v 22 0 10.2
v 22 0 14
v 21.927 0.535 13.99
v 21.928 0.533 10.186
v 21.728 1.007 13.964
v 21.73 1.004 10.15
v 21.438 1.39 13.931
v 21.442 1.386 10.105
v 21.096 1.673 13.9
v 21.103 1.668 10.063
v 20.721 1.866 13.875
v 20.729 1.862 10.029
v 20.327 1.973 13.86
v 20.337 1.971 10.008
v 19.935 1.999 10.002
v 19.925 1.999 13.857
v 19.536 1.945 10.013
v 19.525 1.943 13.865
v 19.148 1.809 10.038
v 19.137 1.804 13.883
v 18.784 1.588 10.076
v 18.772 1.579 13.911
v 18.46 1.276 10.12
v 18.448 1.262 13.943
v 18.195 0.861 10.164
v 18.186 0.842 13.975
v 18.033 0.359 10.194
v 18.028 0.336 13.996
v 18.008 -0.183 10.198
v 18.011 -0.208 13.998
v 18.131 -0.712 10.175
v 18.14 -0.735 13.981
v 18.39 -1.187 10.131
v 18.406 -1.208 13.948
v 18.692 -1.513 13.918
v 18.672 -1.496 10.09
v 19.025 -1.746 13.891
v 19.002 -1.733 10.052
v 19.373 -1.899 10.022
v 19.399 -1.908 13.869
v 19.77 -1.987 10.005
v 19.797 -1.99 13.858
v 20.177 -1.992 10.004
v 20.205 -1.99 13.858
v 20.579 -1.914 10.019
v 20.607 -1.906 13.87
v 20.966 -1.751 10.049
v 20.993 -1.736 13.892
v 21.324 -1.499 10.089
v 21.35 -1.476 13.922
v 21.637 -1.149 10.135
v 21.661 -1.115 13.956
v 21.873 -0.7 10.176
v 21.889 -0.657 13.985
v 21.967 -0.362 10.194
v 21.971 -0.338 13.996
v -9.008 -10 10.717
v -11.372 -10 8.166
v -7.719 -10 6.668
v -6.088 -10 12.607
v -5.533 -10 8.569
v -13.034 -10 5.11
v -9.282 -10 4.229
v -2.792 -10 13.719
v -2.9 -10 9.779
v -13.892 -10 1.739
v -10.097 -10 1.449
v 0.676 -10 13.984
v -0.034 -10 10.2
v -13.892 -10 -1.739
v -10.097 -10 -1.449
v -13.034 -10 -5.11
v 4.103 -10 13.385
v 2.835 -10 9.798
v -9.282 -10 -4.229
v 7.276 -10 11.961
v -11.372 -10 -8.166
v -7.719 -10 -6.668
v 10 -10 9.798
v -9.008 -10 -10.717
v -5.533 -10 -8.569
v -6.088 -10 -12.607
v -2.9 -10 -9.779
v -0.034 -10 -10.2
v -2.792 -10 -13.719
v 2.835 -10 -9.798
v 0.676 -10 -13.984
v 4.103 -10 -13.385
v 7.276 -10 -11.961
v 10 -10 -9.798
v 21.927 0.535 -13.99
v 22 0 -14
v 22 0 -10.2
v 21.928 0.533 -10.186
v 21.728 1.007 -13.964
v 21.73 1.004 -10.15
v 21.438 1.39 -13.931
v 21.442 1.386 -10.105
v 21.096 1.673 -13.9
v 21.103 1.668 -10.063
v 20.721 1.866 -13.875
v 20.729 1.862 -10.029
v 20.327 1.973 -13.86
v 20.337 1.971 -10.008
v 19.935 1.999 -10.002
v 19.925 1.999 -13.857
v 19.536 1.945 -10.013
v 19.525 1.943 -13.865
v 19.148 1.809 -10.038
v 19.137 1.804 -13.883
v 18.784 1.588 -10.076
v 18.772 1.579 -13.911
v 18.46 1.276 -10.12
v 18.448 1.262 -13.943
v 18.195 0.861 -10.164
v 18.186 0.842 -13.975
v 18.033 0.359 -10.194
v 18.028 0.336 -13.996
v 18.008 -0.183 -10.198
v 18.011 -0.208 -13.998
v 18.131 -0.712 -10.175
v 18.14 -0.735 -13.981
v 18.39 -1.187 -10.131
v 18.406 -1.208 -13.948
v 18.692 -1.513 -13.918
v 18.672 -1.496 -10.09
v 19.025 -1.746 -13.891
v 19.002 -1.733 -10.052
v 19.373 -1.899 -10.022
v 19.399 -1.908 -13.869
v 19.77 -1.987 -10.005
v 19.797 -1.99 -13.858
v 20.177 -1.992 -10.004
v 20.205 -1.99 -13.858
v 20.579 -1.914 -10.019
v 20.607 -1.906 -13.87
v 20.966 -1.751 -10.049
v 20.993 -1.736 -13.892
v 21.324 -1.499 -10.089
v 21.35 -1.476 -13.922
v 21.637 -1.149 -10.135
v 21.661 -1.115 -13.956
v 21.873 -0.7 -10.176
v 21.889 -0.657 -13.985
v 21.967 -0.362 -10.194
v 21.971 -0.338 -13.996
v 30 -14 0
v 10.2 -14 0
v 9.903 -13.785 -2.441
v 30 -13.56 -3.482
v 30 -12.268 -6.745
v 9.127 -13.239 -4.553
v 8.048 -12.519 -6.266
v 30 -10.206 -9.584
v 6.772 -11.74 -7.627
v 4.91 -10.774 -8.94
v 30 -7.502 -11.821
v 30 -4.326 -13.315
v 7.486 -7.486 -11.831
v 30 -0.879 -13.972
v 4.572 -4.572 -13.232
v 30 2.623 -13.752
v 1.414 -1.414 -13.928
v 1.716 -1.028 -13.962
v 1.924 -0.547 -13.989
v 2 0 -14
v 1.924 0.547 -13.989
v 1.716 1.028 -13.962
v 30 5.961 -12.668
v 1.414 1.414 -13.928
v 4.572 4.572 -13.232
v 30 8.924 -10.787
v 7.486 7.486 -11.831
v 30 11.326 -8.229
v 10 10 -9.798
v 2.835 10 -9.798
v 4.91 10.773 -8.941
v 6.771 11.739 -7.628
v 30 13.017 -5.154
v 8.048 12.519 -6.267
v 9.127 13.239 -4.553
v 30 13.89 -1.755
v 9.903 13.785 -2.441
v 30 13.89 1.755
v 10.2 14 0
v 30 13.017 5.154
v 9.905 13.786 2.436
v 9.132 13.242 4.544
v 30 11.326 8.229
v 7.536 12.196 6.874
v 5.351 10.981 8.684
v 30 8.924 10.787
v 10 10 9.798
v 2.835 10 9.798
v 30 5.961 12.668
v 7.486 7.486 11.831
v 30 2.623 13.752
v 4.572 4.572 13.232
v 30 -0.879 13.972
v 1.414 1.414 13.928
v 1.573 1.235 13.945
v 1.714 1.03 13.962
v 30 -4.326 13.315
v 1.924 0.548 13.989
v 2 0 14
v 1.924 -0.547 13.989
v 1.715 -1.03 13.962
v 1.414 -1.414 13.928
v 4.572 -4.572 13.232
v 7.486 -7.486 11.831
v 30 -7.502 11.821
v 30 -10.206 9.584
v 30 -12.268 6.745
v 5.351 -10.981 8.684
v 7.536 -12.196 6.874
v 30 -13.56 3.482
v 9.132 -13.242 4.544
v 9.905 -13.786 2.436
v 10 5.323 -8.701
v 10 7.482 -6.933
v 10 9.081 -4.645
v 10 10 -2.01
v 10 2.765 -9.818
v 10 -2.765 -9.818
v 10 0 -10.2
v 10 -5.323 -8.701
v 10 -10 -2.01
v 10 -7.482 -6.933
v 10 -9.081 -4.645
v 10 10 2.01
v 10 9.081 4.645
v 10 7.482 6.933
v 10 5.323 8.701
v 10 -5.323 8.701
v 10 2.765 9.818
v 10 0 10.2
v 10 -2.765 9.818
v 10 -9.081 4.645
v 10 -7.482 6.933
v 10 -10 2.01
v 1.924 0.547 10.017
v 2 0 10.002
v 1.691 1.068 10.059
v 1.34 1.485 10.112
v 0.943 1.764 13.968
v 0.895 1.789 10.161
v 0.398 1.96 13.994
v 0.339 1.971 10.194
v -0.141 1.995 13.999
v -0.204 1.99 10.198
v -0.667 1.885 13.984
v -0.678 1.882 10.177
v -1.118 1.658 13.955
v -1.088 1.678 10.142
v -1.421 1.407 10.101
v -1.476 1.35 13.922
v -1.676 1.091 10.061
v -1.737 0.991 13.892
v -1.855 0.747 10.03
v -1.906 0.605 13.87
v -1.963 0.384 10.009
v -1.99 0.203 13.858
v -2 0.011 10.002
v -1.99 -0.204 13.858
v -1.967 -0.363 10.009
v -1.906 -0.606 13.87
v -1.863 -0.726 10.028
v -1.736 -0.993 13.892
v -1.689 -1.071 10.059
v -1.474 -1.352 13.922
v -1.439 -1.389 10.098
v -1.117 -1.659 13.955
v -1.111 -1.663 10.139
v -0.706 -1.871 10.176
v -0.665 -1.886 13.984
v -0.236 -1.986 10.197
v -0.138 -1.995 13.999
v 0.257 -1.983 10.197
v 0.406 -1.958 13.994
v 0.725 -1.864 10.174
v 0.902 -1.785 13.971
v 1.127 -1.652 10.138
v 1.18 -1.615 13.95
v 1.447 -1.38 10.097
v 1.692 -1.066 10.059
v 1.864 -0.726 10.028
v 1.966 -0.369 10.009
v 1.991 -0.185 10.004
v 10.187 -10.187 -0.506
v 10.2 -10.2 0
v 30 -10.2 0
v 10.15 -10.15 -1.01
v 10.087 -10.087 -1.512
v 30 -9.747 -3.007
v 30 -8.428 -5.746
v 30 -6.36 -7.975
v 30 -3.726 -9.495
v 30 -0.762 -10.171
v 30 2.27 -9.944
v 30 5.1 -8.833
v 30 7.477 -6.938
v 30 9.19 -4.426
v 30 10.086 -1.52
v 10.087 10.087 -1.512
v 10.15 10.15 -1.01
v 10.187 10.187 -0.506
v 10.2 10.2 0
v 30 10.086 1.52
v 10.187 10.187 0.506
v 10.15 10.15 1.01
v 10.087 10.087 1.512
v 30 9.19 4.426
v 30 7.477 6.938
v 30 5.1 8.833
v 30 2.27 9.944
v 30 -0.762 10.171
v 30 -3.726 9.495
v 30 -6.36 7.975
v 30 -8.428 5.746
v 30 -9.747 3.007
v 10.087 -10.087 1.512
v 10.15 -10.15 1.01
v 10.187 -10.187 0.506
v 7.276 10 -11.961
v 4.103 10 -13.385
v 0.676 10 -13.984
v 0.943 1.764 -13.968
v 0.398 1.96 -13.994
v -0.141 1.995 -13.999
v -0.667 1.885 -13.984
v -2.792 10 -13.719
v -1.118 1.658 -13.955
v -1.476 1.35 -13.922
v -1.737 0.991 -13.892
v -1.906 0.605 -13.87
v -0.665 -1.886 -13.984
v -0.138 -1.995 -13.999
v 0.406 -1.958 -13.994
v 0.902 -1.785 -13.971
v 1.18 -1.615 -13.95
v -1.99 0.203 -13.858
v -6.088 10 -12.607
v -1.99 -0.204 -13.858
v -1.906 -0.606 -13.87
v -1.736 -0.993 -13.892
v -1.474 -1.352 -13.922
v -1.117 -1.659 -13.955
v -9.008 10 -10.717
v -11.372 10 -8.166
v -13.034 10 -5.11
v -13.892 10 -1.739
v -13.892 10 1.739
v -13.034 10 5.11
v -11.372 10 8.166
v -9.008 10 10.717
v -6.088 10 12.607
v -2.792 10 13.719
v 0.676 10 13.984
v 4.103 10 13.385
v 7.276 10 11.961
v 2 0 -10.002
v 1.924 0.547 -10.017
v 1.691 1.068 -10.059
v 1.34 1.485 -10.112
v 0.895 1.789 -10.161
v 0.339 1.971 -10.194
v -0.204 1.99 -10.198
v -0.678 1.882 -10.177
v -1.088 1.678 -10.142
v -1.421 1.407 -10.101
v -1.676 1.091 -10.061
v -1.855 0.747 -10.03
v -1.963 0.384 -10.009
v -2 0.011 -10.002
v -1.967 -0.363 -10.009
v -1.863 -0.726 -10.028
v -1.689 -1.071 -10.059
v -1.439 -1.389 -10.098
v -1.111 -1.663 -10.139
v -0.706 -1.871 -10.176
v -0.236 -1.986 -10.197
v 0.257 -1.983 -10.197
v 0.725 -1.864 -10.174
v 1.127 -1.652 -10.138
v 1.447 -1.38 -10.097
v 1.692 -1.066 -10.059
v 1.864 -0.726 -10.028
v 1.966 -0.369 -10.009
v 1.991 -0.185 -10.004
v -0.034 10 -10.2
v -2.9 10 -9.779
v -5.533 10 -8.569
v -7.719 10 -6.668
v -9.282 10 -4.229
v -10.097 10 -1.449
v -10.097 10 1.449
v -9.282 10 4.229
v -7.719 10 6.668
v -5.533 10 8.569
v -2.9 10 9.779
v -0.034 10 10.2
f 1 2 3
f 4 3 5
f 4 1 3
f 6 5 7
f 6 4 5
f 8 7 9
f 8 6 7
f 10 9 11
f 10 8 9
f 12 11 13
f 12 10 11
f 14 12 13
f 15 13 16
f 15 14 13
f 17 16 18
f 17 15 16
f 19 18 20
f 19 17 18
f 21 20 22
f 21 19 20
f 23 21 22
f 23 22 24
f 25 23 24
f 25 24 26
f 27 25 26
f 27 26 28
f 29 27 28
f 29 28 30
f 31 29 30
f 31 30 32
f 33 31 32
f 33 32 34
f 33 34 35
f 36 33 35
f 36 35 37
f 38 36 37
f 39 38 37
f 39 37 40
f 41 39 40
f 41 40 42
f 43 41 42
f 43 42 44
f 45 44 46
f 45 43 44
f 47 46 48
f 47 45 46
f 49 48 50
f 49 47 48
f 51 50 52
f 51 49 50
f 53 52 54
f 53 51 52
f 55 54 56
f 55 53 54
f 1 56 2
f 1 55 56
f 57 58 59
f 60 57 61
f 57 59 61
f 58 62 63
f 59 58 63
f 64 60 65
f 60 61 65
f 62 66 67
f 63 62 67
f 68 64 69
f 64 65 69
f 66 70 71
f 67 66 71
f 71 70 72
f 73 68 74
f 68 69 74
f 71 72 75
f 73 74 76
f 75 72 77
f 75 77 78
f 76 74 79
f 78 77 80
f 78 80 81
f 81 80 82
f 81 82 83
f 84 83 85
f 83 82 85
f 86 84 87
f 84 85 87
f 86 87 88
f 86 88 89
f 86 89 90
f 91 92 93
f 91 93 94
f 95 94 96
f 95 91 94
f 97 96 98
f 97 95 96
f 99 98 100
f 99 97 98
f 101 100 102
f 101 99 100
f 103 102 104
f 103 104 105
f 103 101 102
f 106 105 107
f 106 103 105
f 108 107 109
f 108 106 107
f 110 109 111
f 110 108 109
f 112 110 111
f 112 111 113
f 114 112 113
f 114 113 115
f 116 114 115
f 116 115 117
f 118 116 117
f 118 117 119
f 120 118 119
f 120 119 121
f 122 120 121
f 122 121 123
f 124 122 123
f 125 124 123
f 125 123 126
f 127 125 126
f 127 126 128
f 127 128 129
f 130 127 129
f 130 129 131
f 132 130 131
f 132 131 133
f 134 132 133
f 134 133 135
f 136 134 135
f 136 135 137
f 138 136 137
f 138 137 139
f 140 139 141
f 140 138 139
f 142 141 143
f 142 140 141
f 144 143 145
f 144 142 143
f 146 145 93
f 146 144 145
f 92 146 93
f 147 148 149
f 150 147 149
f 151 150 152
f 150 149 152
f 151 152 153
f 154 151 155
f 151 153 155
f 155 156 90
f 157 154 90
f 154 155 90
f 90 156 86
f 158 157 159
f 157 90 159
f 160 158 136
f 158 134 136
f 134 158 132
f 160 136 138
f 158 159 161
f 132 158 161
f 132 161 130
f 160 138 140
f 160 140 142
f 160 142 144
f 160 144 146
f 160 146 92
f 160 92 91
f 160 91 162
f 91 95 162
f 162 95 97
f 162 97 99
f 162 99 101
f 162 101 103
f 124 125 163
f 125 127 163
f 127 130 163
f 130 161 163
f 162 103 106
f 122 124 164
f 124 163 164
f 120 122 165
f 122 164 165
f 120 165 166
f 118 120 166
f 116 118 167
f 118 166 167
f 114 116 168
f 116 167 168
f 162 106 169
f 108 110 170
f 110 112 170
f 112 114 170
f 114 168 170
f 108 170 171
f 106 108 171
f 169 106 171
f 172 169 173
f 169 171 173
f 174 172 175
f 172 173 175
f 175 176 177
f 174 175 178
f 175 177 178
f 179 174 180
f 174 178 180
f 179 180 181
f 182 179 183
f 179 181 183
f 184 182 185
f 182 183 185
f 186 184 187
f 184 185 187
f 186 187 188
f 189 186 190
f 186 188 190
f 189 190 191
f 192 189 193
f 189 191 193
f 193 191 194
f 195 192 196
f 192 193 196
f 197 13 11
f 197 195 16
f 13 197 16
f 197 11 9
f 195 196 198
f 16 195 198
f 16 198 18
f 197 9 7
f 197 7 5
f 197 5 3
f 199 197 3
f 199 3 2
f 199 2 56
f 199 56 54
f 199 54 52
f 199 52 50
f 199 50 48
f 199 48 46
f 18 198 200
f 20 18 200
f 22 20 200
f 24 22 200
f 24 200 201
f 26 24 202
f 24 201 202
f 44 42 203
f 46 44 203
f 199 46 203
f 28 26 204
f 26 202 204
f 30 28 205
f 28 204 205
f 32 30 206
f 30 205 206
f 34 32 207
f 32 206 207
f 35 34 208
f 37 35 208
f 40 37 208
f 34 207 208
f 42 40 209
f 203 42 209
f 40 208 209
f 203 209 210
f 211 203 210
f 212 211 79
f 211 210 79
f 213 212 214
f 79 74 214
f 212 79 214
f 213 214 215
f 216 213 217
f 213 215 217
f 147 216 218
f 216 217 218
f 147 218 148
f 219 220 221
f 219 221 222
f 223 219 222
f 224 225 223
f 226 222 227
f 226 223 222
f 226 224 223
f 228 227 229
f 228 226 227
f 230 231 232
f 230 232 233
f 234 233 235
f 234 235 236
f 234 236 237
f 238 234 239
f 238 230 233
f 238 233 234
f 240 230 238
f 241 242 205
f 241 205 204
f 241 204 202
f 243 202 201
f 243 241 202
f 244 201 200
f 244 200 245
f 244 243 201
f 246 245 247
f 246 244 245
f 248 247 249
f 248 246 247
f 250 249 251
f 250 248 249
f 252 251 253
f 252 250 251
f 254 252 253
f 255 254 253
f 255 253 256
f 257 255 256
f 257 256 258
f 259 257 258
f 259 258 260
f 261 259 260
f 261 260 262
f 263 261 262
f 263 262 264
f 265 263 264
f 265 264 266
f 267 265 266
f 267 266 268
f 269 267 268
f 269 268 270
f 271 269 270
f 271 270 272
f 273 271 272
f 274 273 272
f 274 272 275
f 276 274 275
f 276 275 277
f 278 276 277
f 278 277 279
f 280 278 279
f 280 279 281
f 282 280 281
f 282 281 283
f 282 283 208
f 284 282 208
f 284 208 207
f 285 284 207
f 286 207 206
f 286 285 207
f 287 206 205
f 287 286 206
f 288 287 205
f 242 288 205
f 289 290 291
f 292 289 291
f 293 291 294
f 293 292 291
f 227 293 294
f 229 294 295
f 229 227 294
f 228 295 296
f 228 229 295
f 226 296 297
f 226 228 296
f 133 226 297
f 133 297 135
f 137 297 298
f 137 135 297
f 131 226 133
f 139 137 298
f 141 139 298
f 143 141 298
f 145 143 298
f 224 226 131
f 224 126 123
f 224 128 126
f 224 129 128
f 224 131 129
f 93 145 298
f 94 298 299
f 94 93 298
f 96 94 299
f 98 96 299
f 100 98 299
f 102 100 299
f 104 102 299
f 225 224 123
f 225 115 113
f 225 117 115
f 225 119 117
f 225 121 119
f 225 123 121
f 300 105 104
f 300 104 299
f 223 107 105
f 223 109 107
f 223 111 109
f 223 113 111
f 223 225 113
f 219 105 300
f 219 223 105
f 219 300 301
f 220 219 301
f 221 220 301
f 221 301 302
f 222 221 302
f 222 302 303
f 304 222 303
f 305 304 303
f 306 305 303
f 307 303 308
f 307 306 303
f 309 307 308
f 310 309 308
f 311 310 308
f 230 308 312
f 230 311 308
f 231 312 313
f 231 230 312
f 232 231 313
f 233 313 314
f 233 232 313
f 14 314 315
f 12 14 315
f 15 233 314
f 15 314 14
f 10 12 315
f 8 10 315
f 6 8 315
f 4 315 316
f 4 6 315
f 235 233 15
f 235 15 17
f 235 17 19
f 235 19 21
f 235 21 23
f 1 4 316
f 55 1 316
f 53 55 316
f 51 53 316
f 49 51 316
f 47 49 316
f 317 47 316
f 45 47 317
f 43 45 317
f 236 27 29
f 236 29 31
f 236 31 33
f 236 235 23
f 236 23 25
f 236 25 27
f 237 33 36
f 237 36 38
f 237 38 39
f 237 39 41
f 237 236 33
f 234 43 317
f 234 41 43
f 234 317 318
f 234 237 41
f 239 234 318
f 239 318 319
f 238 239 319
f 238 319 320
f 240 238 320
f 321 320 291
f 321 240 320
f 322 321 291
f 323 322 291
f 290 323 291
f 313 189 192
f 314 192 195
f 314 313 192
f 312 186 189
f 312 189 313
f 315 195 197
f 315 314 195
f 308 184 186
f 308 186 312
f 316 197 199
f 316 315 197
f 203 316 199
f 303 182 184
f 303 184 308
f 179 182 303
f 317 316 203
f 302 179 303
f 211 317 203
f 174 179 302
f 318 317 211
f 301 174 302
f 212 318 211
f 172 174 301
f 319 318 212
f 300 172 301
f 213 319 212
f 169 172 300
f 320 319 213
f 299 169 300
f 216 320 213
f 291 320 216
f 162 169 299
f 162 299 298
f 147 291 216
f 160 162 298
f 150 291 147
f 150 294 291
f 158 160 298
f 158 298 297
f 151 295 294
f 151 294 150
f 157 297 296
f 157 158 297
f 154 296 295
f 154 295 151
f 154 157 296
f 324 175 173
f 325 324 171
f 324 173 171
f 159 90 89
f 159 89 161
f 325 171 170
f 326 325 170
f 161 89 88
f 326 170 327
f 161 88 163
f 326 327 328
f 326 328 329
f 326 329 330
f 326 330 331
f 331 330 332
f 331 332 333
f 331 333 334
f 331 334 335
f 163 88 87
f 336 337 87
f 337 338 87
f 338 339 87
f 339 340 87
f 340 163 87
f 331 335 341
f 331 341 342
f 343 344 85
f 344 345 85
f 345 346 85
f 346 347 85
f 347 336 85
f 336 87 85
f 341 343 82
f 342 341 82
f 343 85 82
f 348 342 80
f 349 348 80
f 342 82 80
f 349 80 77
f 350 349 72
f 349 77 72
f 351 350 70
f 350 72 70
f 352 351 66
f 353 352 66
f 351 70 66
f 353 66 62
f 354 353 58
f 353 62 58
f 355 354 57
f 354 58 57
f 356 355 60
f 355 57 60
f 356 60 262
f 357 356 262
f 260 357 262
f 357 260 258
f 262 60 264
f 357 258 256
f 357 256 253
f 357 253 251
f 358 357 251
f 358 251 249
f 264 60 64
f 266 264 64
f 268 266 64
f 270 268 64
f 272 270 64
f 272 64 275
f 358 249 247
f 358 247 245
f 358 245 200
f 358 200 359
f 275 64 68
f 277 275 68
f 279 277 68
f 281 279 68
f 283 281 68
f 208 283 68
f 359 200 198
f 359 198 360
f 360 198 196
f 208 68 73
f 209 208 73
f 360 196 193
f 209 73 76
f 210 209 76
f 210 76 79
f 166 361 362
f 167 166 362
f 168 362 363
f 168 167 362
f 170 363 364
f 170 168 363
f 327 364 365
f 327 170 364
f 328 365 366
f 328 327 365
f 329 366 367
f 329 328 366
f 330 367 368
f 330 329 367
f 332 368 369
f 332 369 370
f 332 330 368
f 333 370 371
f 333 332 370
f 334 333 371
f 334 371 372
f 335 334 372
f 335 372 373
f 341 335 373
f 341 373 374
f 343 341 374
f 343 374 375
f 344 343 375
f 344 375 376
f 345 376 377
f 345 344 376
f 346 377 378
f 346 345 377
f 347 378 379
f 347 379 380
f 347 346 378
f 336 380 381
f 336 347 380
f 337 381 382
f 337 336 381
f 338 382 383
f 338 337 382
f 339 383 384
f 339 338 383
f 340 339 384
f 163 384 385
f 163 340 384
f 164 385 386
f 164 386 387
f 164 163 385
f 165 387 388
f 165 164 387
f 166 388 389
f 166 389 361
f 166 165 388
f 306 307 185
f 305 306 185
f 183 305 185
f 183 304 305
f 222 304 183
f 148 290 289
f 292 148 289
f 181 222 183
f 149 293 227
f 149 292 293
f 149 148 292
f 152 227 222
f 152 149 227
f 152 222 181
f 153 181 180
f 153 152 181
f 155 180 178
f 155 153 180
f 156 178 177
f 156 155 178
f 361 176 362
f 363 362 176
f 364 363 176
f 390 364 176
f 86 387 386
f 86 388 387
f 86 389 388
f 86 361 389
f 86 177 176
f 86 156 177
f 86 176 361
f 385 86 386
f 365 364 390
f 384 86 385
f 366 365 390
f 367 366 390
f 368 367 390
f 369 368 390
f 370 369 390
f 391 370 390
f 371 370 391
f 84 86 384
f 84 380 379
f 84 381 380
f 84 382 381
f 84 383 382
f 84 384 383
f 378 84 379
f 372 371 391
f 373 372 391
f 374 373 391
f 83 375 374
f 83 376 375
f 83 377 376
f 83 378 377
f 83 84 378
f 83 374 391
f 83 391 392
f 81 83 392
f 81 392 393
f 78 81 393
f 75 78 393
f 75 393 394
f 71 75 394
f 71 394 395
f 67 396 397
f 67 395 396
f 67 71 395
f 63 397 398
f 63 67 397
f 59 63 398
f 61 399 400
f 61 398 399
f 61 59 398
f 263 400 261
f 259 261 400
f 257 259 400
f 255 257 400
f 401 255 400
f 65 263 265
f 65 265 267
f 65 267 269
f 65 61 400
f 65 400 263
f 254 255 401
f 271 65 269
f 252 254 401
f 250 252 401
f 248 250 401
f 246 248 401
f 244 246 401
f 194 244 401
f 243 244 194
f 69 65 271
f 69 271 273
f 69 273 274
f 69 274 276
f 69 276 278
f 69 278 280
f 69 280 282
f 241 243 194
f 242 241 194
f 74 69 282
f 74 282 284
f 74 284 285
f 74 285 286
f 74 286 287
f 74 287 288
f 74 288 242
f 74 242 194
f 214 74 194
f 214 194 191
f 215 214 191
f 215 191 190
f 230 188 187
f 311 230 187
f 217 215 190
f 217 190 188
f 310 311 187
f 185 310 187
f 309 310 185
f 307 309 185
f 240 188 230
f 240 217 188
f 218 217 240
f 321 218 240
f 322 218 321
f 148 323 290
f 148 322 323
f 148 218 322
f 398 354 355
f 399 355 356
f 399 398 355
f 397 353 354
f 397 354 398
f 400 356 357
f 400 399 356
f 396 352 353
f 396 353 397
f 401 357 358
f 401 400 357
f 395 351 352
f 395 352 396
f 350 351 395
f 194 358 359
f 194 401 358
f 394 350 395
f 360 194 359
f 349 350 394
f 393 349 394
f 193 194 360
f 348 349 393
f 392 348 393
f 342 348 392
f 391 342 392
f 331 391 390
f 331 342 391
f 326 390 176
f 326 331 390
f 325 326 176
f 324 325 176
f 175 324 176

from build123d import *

# Parameters (mm, degrees)
CYLINDER001_R          = 10.2
CYLINDER001_DEPTH      = 20
CYLINDER002_R          = 2
CYLINDER002_DEPTH      = 30
CYLINDER003_R          = 2
CYLINDER003_DEPTH      = 30
CYLINDER_R             = 10.2
CYLINDER_DEPTH         = 30
CYLINDER_ROLL_ANGLE    = -90
CYLINDER004_R          = 14
CYLINDER004_DEPTH      = 30
CYLINDER005_R          = 14
CYLINDER005_DEPTH      = 20
CYLINDER005_ROLL_ANGLE = -90


with BuildPart() as cylinder001:
    # Cylinder001 → Cylinder001 (new body)
    with BuildSketch(Plane(origin=(10, 0, 0), x_dir=(0, -1, 0), z_dir=(1, 0, 0))):
        Circle(CYLINDER001_R)
    extrude(amount=CYLINDER001_DEPTH)


with BuildPart() as cylinder002:
    # Cylinder002 → Cylinder002 (new body)
    with BuildSketch(Plane.XY.offset(-15)):
        Circle(CYLINDER002_R)
    extrude(amount=CYLINDER002_DEPTH)


with BuildPart() as cylinder003:
    # Cylinder003 → Cylinder003 (new body)
    with BuildSketch(Plane(origin=(20, 0, -15), x_dir=(1, 0, 0), z_dir=(0, 0, 1))):
        Circle(CYLINDER003_R)
    extrude(amount=CYLINDER003_DEPTH)


with BuildPart() as negative_fusion:
    # Cylinder → Cylinder (new body)
    with BuildSketch(Plane.XY):
        Circle(CYLINDER_R)
    extrude(amount=CYLINDER_DEPTH)


with BuildPart() as negative_fusion_1:
    # Cylinder roll: moved
    add(negative_fusion.part.rotate(Axis((0, 0, 0), (1, 0, 0)), CYLINDER_ROLL_ANGLE))


with BuildPart() as negative_fusion_2:
    # Cylinder placement: moved
    add(negative_fusion_1.part.moved(Location((0, -15, 0))))

    # Fusion: union Cylinder001, Cylinder002, Cylinder003
    add(cylinder001.part)
    add(cylinder002.part)
    add(cylinder003.part)


with BuildPart() as cylinder004:
    # Cylinder004 → Cylinder004 (new body)
    with BuildSketch(Plane(origin=(0, 0, 0), x_dir=(0, -1, 0), z_dir=(1, 0, 0))):
        Circle(CYLINDER004_R)
    extrude(amount=CYLINDER004_DEPTH)


with BuildPart() as cut:
    # Cylinder005 → Cylinder005 (new body)
    with BuildSketch(Plane.XY):
        Circle(CYLINDER005_R)
    extrude(amount=CYLINDER005_DEPTH)


with BuildPart() as cut_1:
    # Cylinder005 roll: moved
    add(cut.part.rotate(Axis((0, 0, 0), (1, 0, 0)), CYLINDER005_ROLL_ANGLE))


with BuildPart() as cut_2:
    # Cylinder005 placement: moved
    add(cut_1.part.moved(Location((0, -10, 0))))

    # Fusion001: union Cylinder004
    add(cylinder004.part)

    # Cut: cut Negative Fusion
    add(negative_fusion_2.part, mode=Mode.SUBTRACT)


solid = cut_2.part
